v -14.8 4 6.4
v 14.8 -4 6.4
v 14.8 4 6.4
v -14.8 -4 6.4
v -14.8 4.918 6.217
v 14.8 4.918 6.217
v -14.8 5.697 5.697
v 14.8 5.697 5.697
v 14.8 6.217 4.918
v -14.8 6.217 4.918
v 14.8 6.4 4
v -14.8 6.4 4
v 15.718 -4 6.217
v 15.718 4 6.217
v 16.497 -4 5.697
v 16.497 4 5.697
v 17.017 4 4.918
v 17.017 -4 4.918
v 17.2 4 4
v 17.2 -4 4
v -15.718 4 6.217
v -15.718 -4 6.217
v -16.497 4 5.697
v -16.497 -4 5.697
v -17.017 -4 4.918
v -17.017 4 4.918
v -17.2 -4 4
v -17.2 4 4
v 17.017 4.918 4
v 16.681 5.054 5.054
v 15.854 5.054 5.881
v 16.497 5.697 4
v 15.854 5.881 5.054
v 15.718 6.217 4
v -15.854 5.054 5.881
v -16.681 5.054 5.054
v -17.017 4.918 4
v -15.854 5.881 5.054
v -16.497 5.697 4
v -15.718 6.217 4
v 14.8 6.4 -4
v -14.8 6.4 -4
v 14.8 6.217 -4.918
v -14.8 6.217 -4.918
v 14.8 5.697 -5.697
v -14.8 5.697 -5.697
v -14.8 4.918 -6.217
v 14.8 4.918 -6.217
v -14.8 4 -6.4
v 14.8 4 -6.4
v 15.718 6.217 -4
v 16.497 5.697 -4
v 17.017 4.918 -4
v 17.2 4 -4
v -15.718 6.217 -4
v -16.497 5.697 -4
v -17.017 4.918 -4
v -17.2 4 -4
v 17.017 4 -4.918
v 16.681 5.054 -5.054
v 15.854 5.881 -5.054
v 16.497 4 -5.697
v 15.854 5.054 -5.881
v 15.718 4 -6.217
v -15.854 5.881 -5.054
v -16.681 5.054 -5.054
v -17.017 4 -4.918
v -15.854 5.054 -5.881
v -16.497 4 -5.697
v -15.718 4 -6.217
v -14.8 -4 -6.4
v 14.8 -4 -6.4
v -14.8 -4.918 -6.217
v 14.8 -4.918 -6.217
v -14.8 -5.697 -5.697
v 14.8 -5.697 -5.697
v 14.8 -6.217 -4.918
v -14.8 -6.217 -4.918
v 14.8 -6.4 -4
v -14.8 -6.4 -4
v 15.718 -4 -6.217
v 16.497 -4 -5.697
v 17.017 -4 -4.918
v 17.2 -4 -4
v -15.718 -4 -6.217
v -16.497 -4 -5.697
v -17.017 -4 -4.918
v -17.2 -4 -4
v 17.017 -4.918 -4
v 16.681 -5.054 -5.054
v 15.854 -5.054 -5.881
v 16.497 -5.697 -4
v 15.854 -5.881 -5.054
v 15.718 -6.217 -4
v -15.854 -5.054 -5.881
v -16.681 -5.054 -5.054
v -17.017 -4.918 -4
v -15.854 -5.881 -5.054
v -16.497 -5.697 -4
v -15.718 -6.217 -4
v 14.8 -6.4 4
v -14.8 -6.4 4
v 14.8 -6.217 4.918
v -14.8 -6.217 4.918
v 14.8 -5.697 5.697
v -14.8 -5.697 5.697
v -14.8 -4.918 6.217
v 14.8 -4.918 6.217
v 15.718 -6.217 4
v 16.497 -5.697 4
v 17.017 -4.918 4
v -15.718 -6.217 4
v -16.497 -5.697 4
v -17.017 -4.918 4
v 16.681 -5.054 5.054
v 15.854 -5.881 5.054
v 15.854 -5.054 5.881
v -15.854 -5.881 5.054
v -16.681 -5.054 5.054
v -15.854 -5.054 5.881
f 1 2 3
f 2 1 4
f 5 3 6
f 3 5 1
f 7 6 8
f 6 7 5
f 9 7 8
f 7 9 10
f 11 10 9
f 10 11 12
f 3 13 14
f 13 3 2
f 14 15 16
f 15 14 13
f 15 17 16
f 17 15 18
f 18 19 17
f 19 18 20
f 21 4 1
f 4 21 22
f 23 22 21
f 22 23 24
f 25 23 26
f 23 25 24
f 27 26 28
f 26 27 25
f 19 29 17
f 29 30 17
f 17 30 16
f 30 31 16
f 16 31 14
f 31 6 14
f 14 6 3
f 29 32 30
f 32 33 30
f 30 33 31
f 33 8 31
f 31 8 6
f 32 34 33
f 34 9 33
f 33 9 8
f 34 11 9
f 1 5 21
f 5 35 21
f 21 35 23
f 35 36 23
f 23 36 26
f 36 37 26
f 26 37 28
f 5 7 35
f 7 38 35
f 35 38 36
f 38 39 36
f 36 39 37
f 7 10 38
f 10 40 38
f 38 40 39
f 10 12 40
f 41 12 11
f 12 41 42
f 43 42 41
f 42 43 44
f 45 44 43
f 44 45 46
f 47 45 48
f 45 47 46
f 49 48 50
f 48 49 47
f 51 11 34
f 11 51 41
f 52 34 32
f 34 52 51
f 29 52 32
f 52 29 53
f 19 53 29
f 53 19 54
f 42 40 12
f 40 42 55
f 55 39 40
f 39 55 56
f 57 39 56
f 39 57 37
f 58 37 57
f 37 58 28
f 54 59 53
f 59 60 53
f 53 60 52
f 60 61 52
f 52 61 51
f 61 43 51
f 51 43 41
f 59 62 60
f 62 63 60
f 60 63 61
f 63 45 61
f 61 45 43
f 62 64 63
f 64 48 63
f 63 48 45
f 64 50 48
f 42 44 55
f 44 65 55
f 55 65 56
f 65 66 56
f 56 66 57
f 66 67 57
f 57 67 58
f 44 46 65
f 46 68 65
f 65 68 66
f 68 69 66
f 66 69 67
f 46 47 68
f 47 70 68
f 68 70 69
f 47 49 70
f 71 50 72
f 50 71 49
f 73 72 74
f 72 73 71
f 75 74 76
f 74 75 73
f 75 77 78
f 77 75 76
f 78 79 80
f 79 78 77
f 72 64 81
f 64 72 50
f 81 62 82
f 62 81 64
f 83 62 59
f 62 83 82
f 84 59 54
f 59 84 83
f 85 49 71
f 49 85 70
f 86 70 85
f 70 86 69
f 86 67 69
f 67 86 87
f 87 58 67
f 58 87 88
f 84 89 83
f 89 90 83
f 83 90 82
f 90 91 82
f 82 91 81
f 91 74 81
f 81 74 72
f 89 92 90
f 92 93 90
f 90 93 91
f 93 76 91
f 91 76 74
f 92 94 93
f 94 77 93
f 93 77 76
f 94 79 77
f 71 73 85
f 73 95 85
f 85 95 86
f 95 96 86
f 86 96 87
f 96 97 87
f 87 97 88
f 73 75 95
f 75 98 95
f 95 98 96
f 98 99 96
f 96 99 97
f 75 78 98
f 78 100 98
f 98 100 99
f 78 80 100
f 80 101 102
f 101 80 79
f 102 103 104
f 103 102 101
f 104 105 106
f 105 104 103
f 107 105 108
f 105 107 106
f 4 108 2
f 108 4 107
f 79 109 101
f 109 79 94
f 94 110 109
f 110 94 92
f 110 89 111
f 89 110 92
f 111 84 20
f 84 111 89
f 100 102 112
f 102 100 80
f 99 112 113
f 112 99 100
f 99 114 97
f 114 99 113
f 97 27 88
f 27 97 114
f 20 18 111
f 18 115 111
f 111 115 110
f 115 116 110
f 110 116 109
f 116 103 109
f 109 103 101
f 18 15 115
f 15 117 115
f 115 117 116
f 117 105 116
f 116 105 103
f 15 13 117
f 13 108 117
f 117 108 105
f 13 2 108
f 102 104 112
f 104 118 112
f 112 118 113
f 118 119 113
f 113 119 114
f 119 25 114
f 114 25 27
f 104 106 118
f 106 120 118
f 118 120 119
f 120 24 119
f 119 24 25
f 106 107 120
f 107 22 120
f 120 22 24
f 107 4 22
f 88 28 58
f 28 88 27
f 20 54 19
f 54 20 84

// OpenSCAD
// file: ../p/1-8sphe.scad
use <../lib.scad>
function ldraw_lib__1_8sphe() = [
// 0 Sphere 0.125
// 0 Name: 1-8sphe.dat
// 0 Author: James Jessiman
// 0 !LDRAW_ORG Primitive UPDATE 2012-03
// 0 !LICENSE Licensed under CC BY 2.0 and CC BY 4.0 : see CAreadme.txt
// 
// 0 BFC CERTIFY CCW
  [0,"BFC","CERTIFY"],
  [0,"BFC","CCW"],
// 
// 0 !HISTORY 2000-08-01 {Axel Poque} fixes to resolve L3P error messages.
// 0 !HISTORY 2000-08-01 {Manfred Moolhuysen} fixes to resolve L3P error messages.
// 0 !HISTORY 2000-09-30 [PTadmin] Official Update 2000-02
// 0 !HISTORY 2002-03-28 [hafhead] Made BFC compliant
// 0 !HISTORY 2002-04-25 [PTadmin] Official Update 2002-02
// 0 !HISTORY 2007-06-22 [PTadmin] Header formatted for Contributor Agreement
// 0 !HISTORY 2008-07-01 [PTadmin] Official Update 2008-01
// 0 !HISTORY 2010-09-12 [MagFors] Changed winding, removed duplicated cond-line, optimized filesize
// 0 !HISTORY 2010-12-31 [PTadmin] Official Update 2010-03
// 0 !HISTORY 2012-07-01 [tcobbs] Replaced with geometry from LDView
// 0 !HISTORY 2012-12-28 [PTadmin] Official Update 2012-03
// 
// 
// 3 16 1 0 0 0.9239 0.3827 0 0.9239 0 0.3827
  [3,16,1,0,0,0.9239,0.3827,0,0.9239,0,0.3827],
// 3 16 0.9239 0.3827 0 0.7836 0.4393 0.4393 0.9239 0 0.3827
  [3,16,0.9239,0.3827,0,0.7836,0.4393,0.4393,0.9239,0,0.3827],
// 3 16 0.9239 0 0.3827 0.7836 0.4393 0.4393 0.7071 0 0.7071
  [3,16,0.9239,0,0.3827,0.7836,0.4393,0.4393,0.7071,0,0.7071],
// 3 16 0.7836 0.4393 0.4393 0.4393 0.4393 0.7836 0.7071 0 0.7071
  [3,16,0.7836,0.4393,0.4393,0.4393,0.4393,0.7836,0.7071,0,0.7071],
// 3 16 0.7071 0 0.7071 0.4393 0.4393 0.7836 0.3827 0 0.9239
  [3,16,0.7071,0,0.7071,0.4393,0.4393,0.7836,0.3827,0,0.9239],
// 3 16 0.4393 0.4393 0.7836 0 0.3827 0.9239 0.3827 0 0.9239
  [3,16,0.4393,0.4393,0.7836,0,0.3827,0.9239,0.3827,0,0.9239],
// 3 16 0.3827 0 0.9239 0 0.3827 0.9239 0 0 1
  [3,16,0.3827,0,0.9239,0,0.3827,0.9239,0,0,1],
// 3 16 0.9239 0.3827 0 0.7071 0.7071 0 0.7836 0.4393 0.4393
  [3,16,0.9239,0.3827,0,0.7071,0.7071,0,0.7836,0.4393,0.4393],
// 3 16 0.7071 0.7071 0 0.4393 0.7836 0.4393 0.7836 0.4393 0.4393
  [3,16,0.7071,0.7071,0,0.4393,0.7836,0.4393,0.7836,0.4393,0.4393],
// 3 16 0.7836 0.4393 0.4393 0.4393 0.7836 0.4393 0.4393 0.4393 0.7836
  [3,16,0.7836,0.4393,0.4393,0.4393,0.7836,0.4393,0.4393,0.4393,0.7836],
// 3 16 0.4393 0.7836 0.4393 0 0.7071 0.7071 0.4393 0.4393 0.7836
  [3,16,0.4393,0.7836,0.4393,0,0.7071,0.7071,0.4393,0.4393,0.7836],
// 3 16 0.4393 0.4393 0.7836 0 0.7071 0.7071 0 0.3827 0.9239
  [3,16,0.4393,0.4393,0.7836,0,0.7071,0.7071,0,0.3827,0.9239],
// 3 16 0.7071 0.7071 0 0.3827 0.9239 0 0.4393 0.7836 0.4393
  [3,16,0.7071,0.7071,0,0.3827,0.9239,0,0.4393,0.7836,0.4393],
// 3 16 0.3827 0.9239 0 0 0.9239 0.3827 0.4393 0.7836 0.4393
  [3,16,0.3827,0.9239,0,0,0.9239,0.3827,0.4393,0.7836,0.4393],
// 3 16 0.4393 0.7836 0.4393 0 0.9239 0.3827 0 0.7071 0.7071
  [3,16,0.4393,0.7836,0.4393,0,0.9239,0.3827,0,0.7071,0.7071],
// 3 16 0.3827 0.9239 0 0 1 0 0 0.9239 0.3827
  [3,16,0.3827,0.9239,0,0,1,0,0,0.9239,0.3827],
// 
// 5 24 1 0 0 0.9239 0.3827 0 1 0 -0.1 0.9239 0 0.3827
  [5,24,1,0,0,0.9239,0.3827,0,1,0,-0.1,0.9239,0,0.3827],
// 5 24 0.9239 0.3827 0 0.9239 0 0.3827 1 0 0 0.7836 0.4393 0.4393
  [5,24,0.9239,0.3827,0,0.9239,0,0.3827,1,0,0,0.7836,0.4393,0.4393],
// 5 24 1 0 0 0.9239 0 0.3827 0.9239 0.3827 0 1 -0.1 0
  [5,24,1,0,0,0.9239,0,0.3827,0.9239,0.3827,0,1,-0.1,0],
// 5 24 0.9239 0 0.3827 0.7836 0.4393 0.4393 0.9239 0.3827 0 0.7071 0 0.7071
  [5,24,0.9239,0,0.3827,0.7836,0.4393,0.4393,0.9239,0.3827,0,0.7071,0,0.7071],
// 5 24 0.7836 0.4393 0.4393 0.7071 0 0.7071 0.9239 0 0.3827 0.4393 0.4393 0.7836
  [5,24,0.7836,0.4393,0.4393,0.7071,0,0.7071,0.9239,0,0.3827,0.4393,0.4393,0.7836],
// 5 24 0.9239 0 0.3827 0.7071 0 0.7071 0.7836 0.4393 0.4393 0.9239 -0.1 0.3827
  [5,24,0.9239,0,0.3827,0.7071,0,0.7071,0.7836,0.4393,0.4393,0.9239,-0.1,0.3827],
// 5 24 0.7071 0 0.7071 0.4393 0.4393 0.7836 0.7836 0.4393 0.4393 0.3827 0 0.9239
  [5,24,0.7071,0,0.7071,0.4393,0.4393,0.7836,0.7836,0.4393,0.4393,0.3827,0,0.9239],
// 5 24 0.4393 0.4393 0.7836 0.3827 0 0.9239 0.7071 0 0.7071 0 0.3827 0.9239
  [5,24,0.4393,0.4393,0.7836,0.3827,0,0.9239,0.7071,0,0.7071,0,0.3827,0.9239],
// 5 24 0.7071 0 0.7071 0.3827 0 0.9239 0.4393 0.4393 0.7836 0.7071 -0.1 0.7071
  [5,24,0.7071,0,0.7071,0.3827,0,0.9239,0.4393,0.4393,0.7836,0.7071,-0.1,0.7071],
// 5 24 0.3827 0 0.9239 0 0.3827 0.9239 0.4393 0.4393 0.7836 0 0 1
  [5,24,0.3827,0,0.9239,0,0.3827,0.9239,0.4393,0.4393,0.7836,0,0,1],
// 5 24 0 0.3827 0.9239 0 0 1 0.3827 0 0.9239 -0.1 0.3827 0.9239
  [5,24,0,0.3827,0.9239,0,0,1,0.3827,0,0.9239,-0.1,0.3827,0.9239],
// 5 24 0.3827 0 0.9239 0 0 1 0 0.3827 0.9239 0.3827 -0.1 0.9239
  [5,24,0.3827,0,0.9239,0,0,1,0,0.3827,0.9239,0.3827,-0.1,0.9239],
// 5 24 0.9239 0.3827 0 0.7071 0.7071 0 0.9239 0.3827 -0.1 0.7836 0.4393 0.4393
  [5,24,0.9239,0.3827,0,0.7071,0.7071,0,0.9239,0.3827,-0.1,0.7836,0.4393,0.4393],
// 5 24 0.7071 0.7071 0 0.7836 0.4393 0.4393 0.9239 0.3827 0 0.4393 0.7836 0.4393
  [5,24,0.7071,0.7071,0,0.7836,0.4393,0.4393,0.9239,0.3827,0,0.4393,0.7836,0.4393],
// 5 24 0.9239 0.3827 0 0.7836 0.4393 0.4393 0.7071 0.7071 0 0.9239 0 0.3827
  [5,24,0.9239,0.3827,0,0.7836,0.4393,0.4393,0.7071,0.7071,0,0.9239,0,0.3827],
// 5 24 0.7836 0.4393 0.4393 0.4393 0.7836 0.4393 0.7071 0.7071 0 0.4393 0.4393 0.7836
  [5,24,0.7836,0.4393,0.4393,0.4393,0.7836,0.4393,0.7071,0.7071,0,0.4393,0.4393,0.7836],
// 5 24 0.4393 0.7836 0.4393 0.4393 0.4393 0.7836 0.7836 0.4393 0.4393 0 0.7071 0.7071
  [5,24,0.4393,0.7836,0.4393,0.4393,0.4393,0.7836,0.7836,0.4393,0.4393,0,0.7071,0.7071],
// 5 24 0.7836 0.4393 0.4393 0.4393 0.4393 0.7836 0.4393 0.7836 0.4393 0.7071 0 0.7071
  [5,24,0.7836,0.4393,0.4393,0.4393,0.4393,0.7836,0.4393,0.7836,0.4393,0.7071,0,0.7071],
// 5 24 0.4393 0.4393 0.7836 0 0.7071 0.7071 0.4393 0.7836 0.4393 0 0.3827 0.9239
  [5,24,0.4393,0.4393,0.7836,0,0.7071,0.7071,0.4393,0.7836,0.4393,0,0.3827,0.9239],
// 5 24 0 0.7071 0.7071 0 0.3827 0.9239 0.4393 0.4393 0.7836 -0.1 0.7071 0.7071
  [5,24,0,0.7071,0.7071,0,0.3827,0.9239,0.4393,0.4393,0.7836,-0.1,0.7071,0.7071],
// 5 24 0.4393 0.4393 0.7836 0 0.3827 0.9239 0 0.7071 0.7071 0.3827 0 0.9239
  [5,24,0.4393,0.4393,0.7836,0,0.3827,0.9239,0,0.7071,0.7071,0.3827,0,0.9239],
// 5 24 0.7071 0.7071 0 0.3827 0.9239 0 0.7071 0.7071 -0.1 0.4393 0.7836 0.4393
  [5,24,0.7071,0.7071,0,0.3827,0.9239,0,0.7071,0.7071,-0.1,0.4393,0.7836,0.4393],
// 5 24 0.3827 0.9239 0 0.4393 0.7836 0.4393 0.7071 0.7071 0 0 0.9239 0.3827
  [5,24,0.3827,0.9239,0,0.4393,0.7836,0.4393,0.7071,0.7071,0,0,0.9239,0.3827],
// 5 24 0.7071 0.7071 0 0.4393 0.7836 0.4393 0.3827 0.9239 0 0.7836 0.4393 0.4393
  [5,24,0.7071,0.7071,0,0.4393,0.7836,0.4393,0.3827,0.9239,0,0.7836,0.4393,0.4393],
// 5 24 0.4393 0.7836 0.4393 0 0.9239 0.3827 0.3827 0.9239 0 0 0.7071 0.7071
  [5,24,0.4393,0.7836,0.4393,0,0.9239,0.3827,0.3827,0.9239,0,0,0.7071,0.7071],
// 5 24 0 0.9239 0.3827 0 0.7071 0.7071 0.4393 0.7836 0.4393 -0.1 0.9239 0.3827
  [5,24,0,0.9239,0.3827,0,0.7071,0.7071,0.4393,0.7836,0.4393,-0.1,0.9239,0.3827],
// 5 24 0.4393 0.7836 0.4393 0 0.7071 0.7071 0 0.9239 0.3827 0.4393 0.4393 0.7836
  [5,24,0.4393,0.7836,0.4393,0,0.7071,0.7071,0,0.9239,0.3827,0.4393,0.4393,0.7836],
// 5 24 0.3827 0.9239 0 0 1 0 0.3827 0.9239 -0.1 0 0.9239 0.3827
  [5,24,0.3827,0.9239,0,0,1,0,0.3827,0.9239,-0.1,0,0.9239,0.3827],
// 5 24 0 1 0 0 0.9239 0.3827 0.3827 0.9239 0 -0.1 1 0
  [5,24,0,1,0,0,0.9239,0.3827,0.3827,0.9239,0,-0.1,1,0],
// 5 24 0.3827 0.9239 0 0 0.9239 0.3827 0 1 0 0.4393 0.7836 0.4393
  [5,24,0.3827,0.9239,0,0,0.9239,0.3827,0,1,0,0.4393,0.7836,0.4393],
];
module ldraw_lib__1_8sphe(step=0, col=false, unit=2/5, alt=false, line=0.2, solid=!$preview)
    makepoly(ldraw_lib__1_8sphe(), step=step, col=col, unit=unit, alt=alt, line=line, solid=solid);
ldraw_lib__1_8sphe(line=0.2);
// file: ../p/1-4cyli.scad
use <../lib.scad>
function ldraw_lib__1_4cyli() = [
// 0 Cylinder 0.25
// 0 Name: 1-4cyli.dat
// 0 Author: James Jessiman
// 0 !LDRAW_ORG Primitive UPDATE 2012-01
// 0 !LICENSE Licensed under CC BY 4.0 : see CAreadme.txt
// 
// 0 BFC CERTIFY CCW
  [0,"BFC","CERTIFY"],
  [0,"BFC","CCW"],
// 
// 0 !HISTORY 2002-03-23 [sbliss] Added BFC statement.
// 0 !HISTORY 2002-04-25 [PTadmin] Official Update 2002-02
// 0 !HISTORY 2007-06-22 [PTadmin] Header formatted for Contributor Agreement
// 0 !HISTORY 2008-07-01 [PTadmin] Official Update 2008-01
// 0 !HISTORY 2012-02-16 [Philo] Changed to CCW
// 0 !HISTORY 2012-03-30 [PTadmin] Official Update 2012-01
// 
// 
// 4 16 1 1 0 0.9239 1 0.3827 0.9239 0 0.3827 1 0 0
  [4,16,1,1,0,0.9239,1,0.3827,0.9239,0,0.3827,1,0,0],
// 5 24 1 0 0 1 1 0 0.9239 0 0.3827 1 0 -1
  [5,24,1,0,0,1,1,0,0.9239,0,0.3827,1,0,-1],
// 4 16 0.9239 1 0.3827 0.7071 1 0.7071 0.7071 0 0.7071 0.9239 0 0.3827
  [4,16,0.9239,1,0.3827,0.7071,1,0.7071,0.7071,0,0.7071,0.9239,0,0.3827],
// 5 24 0.9239 0 0.3827 0.9239 1 0.3827 0.7071 0 0.7071 1 0 0
  [5,24,0.9239,0,0.3827,0.9239,1,0.3827,0.7071,0,0.7071,1,0,0],
// 4 16 0.7071 1 0.7071 0.3827 1 0.9239 0.3827 0 0.9239 0.7071 0 0.7071
  [4,16,0.7071,1,0.7071,0.3827,1,0.9239,0.3827,0,0.9239,0.7071,0,0.7071],
// 5 24 0.7071 0 0.7071 0.7071 1 0.7071 0.3827 0 0.9239 0.9239 0 0.3827
  [5,24,0.7071,0,0.7071,0.7071,1,0.7071,0.3827,0,0.9239,0.9239,0,0.3827],
// 4 16 0.3827 1 0.9239 0 1 1 0 0 1 0.3827 0 0.9239
  [4,16,0.3827,1,0.9239,0,1,1,0,0,1,0.3827,0,0.9239],
// 5 24 0.3827 0 0.9239 0.3827 1 0.9239 0 0 1 0.7071 0 0.7071
  [5,24,0.3827,0,0.9239,0.3827,1,0.9239,0,0,1,0.7071,0,0.7071],
// 5 24 0 0 1 0 1 1 0.3827 0 0.9239 -1 0 1
  [5,24,0,0,1,0,1,1,0.3827,0,0.9239,-1,0,1],
];
module ldraw_lib__1_4cyli(step=0, col=false, unit=2/5, alt=false, line=0.2, solid=!$preview)
    makepoly(ldraw_lib__1_4cyli(), step=step, col=col, unit=unit, alt=alt, line=line, solid=solid);
ldraw_lib__1_4cyli(line=0.2);
// main file
use <../lib.scad>
use <../p/1-4cyli.scad>
use <../p/1-8sphe.scad>
function ldraw_lib__897() = [
// 0 ~Electric Mindstorms NXT Converter Cable Centre Box
// 0 Name: 897.dat
// 0 Author: Philippe Hurbain [Philo]
// 0 !LDRAW_ORG Part UPDATE 2012-01
// 0 !LICENSE Licensed under CC BY 4.0 : see CAreadme.txt
// 
// 0 BFC CERTIFY CCW
  [0,"BFC","CERTIFY"],
  [0,"BFC","CCW"],
// 
// 0 !HISTORY 2012-03-30 [PTadmin] Official Update 2012-01
// 
// 
// 4 16 -37 -16 -10 37 -16 -10 37 -16 10 -37 -16 10
  [4,16,-37,-16,-10,37,-16,-10,37,-16,10,-37,-16,10],
// 1 16 -37 -10 10 0 74 0 -6 0 0 0 0 6 1-4cyli.dat
  [1,16,-37,-10,10,0,74,0,-6,0,0,0,0,6, ldraw_lib__1_4cyli()],
// 1 16 37 -10 10 0 0 6 -6 0 0 0 -20 0 1-4cyli.dat
  [1,16,37,-10,10,0,0,6,-6,0,0,0,-20,0, ldraw_lib__1_4cyli()],
// 1 16 -37 -10 -10 0 0 -6 -6 0 0 0 20 0 1-4cyli.dat
  [1,16,-37,-10,-10,0,0,-6,-6,0,0,0,20,0, ldraw_lib__1_4cyli()],
// 1 16 37 -10 10 6 0 0 0 0 -6 0 6 0 1-8sphe.dat
  [1,16,37,-10,10,6,0,0,0,0,-6,0,6,0, ldraw_lib__1_8sphe()],
// 1 16 -37 -10 10 0 0 -6 -6 0 0 0 6 0 1-8sphe.dat
  [1,16,-37,-10,10,0,0,-6,-6,0,0,0,6,0, ldraw_lib__1_8sphe()],
// 4 16 -37 -10 16 37 -10 16 37 10 16 -37 10 16
  [4,16,-37,-10,16,37,-10,16,37,10,16,-37,10,16],
// 1 16 -37 10 10 0 74 0 0 0 6 6 0 0 1-4cyli.dat
  [1,16,-37,10,10,0,74,0,0,0,6,6,0,0, ldraw_lib__1_4cyli()],
// 1 16 37 10 10 0 0 6 0 -20 0 6 0 0 1-4cyli.dat
  [1,16,37,10,10,0,0,6,0,-20,0,6,0,0, ldraw_lib__1_4cyli()],
// 1 16 -37 -10 10 0 0 -6 0 20 0 6 0 0 1-4cyli.dat
  [1,16,-37,-10,10,0,0,-6,0,20,0,6,0,0, ldraw_lib__1_4cyli()],
// 1 16 37 10 10 6 0 0 0 6 0 0 0 6 1-8sphe.dat
  [1,16,37,10,10,6,0,0,0,6,0,0,0,6, ldraw_lib__1_8sphe()],
// 1 16 -37 10 10 0 0 -6 0 6 0 6 0 0 1-8sphe.dat
  [1,16,-37,10,10,0,0,-6,0,6,0,6,0,0, ldraw_lib__1_8sphe()],
// 4 16 -37 16 10 37 16 10 37 16 -10 -37 16 -10
  [4,16,-37,16,10,37,16,10,37,16,-10,-37,16,-10],
// 1 16 -37 10 -10 0 74 0 6 0 0 0 0 -6 1-4cyli.dat
  [1,16,-37,10,-10,0,74,0,6,0,0,0,0,-6, ldraw_lib__1_4cyli()],
// 1 16 37 10 -10 0 0 6 6 0 0 0 20 0 1-4cyli.dat
  [1,16,37,10,-10,0,0,6,6,0,0,0,20,0, ldraw_lib__1_4cyli()],
// 1 16 -37 10 10 0 0 -6 6 0 0 0 -20 0 1-4cyli.dat
  [1,16,-37,10,10,0,0,-6,6,0,0,0,-20,0, ldraw_lib__1_4cyli()],
// 1 16 37 10 -10 6 0 0 0 0 6 0 -6 0 1-8sphe.dat
  [1,16,37,10,-10,6,0,0,0,0,6,0,-6,0, ldraw_lib__1_8sphe()],
// 1 16 -37 10 -10 0 0 -6 6 0 0 0 -6 0 1-8sphe.dat
  [1,16,-37,10,-10,0,0,-6,6,0,0,0,-6,0, ldraw_lib__1_8sphe()],
// 4 16 -37 10 -16 37 10 -16 37 -10 -16 -37 -10 -16
  [4,16,-37,10,-16,37,10,-16,37,-10,-16,-37,-10,-16],
// 1 16 -37 -10 -10 0 74 0 0 0 -6 -6 0 0 1-4cyli.dat
  [1,16,-37,-10,-10,0,74,0,0,0,-6,-6,0,0, ldraw_lib__1_4cyli()],
// 1 16 37 -10 -10 0 0 6 0 20 0 -6 0 0 1-4cyli.dat
  [1,16,37,-10,-10,0,0,6,0,20,0,-6,0,0, ldraw_lib__1_4cyli()],
// 1 16 -37 10 -10 0 0 -6 0 -20 0 -6 0 0 1-4cyli.dat
  [1,16,-37,10,-10,0,0,-6,0,-20,0,-6,0,0, ldraw_lib__1_4cyli()],
// 1 16 37 -10 -10 6 0 0 0 -6 0 0 0 -6 1-8sphe.dat
  [1,16,37,-10,-10,6,0,0,0,-6,0,0,0,-6, ldraw_lib__1_8sphe()],
// 1 16 -37 -10 -10 0 0 -6 0 -6 0 -6 0 0 1-8sphe.dat
  [1,16,-37,-10,-10,0,0,-6,0,-6,0,-6,0,0, ldraw_lib__1_8sphe()],
// 4 16 -43 10 -10 -43 -10 -10 -43 -10 10 -43 10 10
  [4,16,-43,10,-10,-43,-10,-10,-43,-10,10,-43,10,10],
// 4 16 43 10 10 43 -10 10 43 -10 -10 43 10 -10
  [4,16,43,10,10,43,-10,10,43,-10,-10,43,10,-10],
];
module ldraw_lib__897(step=0, col=false, unit=2/5, alt=false, line=0.2, solid=!$preview)
    makepoly(ldraw_lib__897(), step=step, col=col, unit=unit, alt=alt, line=line, solid=solid);
ldraw_lib__897(line=0.2);
